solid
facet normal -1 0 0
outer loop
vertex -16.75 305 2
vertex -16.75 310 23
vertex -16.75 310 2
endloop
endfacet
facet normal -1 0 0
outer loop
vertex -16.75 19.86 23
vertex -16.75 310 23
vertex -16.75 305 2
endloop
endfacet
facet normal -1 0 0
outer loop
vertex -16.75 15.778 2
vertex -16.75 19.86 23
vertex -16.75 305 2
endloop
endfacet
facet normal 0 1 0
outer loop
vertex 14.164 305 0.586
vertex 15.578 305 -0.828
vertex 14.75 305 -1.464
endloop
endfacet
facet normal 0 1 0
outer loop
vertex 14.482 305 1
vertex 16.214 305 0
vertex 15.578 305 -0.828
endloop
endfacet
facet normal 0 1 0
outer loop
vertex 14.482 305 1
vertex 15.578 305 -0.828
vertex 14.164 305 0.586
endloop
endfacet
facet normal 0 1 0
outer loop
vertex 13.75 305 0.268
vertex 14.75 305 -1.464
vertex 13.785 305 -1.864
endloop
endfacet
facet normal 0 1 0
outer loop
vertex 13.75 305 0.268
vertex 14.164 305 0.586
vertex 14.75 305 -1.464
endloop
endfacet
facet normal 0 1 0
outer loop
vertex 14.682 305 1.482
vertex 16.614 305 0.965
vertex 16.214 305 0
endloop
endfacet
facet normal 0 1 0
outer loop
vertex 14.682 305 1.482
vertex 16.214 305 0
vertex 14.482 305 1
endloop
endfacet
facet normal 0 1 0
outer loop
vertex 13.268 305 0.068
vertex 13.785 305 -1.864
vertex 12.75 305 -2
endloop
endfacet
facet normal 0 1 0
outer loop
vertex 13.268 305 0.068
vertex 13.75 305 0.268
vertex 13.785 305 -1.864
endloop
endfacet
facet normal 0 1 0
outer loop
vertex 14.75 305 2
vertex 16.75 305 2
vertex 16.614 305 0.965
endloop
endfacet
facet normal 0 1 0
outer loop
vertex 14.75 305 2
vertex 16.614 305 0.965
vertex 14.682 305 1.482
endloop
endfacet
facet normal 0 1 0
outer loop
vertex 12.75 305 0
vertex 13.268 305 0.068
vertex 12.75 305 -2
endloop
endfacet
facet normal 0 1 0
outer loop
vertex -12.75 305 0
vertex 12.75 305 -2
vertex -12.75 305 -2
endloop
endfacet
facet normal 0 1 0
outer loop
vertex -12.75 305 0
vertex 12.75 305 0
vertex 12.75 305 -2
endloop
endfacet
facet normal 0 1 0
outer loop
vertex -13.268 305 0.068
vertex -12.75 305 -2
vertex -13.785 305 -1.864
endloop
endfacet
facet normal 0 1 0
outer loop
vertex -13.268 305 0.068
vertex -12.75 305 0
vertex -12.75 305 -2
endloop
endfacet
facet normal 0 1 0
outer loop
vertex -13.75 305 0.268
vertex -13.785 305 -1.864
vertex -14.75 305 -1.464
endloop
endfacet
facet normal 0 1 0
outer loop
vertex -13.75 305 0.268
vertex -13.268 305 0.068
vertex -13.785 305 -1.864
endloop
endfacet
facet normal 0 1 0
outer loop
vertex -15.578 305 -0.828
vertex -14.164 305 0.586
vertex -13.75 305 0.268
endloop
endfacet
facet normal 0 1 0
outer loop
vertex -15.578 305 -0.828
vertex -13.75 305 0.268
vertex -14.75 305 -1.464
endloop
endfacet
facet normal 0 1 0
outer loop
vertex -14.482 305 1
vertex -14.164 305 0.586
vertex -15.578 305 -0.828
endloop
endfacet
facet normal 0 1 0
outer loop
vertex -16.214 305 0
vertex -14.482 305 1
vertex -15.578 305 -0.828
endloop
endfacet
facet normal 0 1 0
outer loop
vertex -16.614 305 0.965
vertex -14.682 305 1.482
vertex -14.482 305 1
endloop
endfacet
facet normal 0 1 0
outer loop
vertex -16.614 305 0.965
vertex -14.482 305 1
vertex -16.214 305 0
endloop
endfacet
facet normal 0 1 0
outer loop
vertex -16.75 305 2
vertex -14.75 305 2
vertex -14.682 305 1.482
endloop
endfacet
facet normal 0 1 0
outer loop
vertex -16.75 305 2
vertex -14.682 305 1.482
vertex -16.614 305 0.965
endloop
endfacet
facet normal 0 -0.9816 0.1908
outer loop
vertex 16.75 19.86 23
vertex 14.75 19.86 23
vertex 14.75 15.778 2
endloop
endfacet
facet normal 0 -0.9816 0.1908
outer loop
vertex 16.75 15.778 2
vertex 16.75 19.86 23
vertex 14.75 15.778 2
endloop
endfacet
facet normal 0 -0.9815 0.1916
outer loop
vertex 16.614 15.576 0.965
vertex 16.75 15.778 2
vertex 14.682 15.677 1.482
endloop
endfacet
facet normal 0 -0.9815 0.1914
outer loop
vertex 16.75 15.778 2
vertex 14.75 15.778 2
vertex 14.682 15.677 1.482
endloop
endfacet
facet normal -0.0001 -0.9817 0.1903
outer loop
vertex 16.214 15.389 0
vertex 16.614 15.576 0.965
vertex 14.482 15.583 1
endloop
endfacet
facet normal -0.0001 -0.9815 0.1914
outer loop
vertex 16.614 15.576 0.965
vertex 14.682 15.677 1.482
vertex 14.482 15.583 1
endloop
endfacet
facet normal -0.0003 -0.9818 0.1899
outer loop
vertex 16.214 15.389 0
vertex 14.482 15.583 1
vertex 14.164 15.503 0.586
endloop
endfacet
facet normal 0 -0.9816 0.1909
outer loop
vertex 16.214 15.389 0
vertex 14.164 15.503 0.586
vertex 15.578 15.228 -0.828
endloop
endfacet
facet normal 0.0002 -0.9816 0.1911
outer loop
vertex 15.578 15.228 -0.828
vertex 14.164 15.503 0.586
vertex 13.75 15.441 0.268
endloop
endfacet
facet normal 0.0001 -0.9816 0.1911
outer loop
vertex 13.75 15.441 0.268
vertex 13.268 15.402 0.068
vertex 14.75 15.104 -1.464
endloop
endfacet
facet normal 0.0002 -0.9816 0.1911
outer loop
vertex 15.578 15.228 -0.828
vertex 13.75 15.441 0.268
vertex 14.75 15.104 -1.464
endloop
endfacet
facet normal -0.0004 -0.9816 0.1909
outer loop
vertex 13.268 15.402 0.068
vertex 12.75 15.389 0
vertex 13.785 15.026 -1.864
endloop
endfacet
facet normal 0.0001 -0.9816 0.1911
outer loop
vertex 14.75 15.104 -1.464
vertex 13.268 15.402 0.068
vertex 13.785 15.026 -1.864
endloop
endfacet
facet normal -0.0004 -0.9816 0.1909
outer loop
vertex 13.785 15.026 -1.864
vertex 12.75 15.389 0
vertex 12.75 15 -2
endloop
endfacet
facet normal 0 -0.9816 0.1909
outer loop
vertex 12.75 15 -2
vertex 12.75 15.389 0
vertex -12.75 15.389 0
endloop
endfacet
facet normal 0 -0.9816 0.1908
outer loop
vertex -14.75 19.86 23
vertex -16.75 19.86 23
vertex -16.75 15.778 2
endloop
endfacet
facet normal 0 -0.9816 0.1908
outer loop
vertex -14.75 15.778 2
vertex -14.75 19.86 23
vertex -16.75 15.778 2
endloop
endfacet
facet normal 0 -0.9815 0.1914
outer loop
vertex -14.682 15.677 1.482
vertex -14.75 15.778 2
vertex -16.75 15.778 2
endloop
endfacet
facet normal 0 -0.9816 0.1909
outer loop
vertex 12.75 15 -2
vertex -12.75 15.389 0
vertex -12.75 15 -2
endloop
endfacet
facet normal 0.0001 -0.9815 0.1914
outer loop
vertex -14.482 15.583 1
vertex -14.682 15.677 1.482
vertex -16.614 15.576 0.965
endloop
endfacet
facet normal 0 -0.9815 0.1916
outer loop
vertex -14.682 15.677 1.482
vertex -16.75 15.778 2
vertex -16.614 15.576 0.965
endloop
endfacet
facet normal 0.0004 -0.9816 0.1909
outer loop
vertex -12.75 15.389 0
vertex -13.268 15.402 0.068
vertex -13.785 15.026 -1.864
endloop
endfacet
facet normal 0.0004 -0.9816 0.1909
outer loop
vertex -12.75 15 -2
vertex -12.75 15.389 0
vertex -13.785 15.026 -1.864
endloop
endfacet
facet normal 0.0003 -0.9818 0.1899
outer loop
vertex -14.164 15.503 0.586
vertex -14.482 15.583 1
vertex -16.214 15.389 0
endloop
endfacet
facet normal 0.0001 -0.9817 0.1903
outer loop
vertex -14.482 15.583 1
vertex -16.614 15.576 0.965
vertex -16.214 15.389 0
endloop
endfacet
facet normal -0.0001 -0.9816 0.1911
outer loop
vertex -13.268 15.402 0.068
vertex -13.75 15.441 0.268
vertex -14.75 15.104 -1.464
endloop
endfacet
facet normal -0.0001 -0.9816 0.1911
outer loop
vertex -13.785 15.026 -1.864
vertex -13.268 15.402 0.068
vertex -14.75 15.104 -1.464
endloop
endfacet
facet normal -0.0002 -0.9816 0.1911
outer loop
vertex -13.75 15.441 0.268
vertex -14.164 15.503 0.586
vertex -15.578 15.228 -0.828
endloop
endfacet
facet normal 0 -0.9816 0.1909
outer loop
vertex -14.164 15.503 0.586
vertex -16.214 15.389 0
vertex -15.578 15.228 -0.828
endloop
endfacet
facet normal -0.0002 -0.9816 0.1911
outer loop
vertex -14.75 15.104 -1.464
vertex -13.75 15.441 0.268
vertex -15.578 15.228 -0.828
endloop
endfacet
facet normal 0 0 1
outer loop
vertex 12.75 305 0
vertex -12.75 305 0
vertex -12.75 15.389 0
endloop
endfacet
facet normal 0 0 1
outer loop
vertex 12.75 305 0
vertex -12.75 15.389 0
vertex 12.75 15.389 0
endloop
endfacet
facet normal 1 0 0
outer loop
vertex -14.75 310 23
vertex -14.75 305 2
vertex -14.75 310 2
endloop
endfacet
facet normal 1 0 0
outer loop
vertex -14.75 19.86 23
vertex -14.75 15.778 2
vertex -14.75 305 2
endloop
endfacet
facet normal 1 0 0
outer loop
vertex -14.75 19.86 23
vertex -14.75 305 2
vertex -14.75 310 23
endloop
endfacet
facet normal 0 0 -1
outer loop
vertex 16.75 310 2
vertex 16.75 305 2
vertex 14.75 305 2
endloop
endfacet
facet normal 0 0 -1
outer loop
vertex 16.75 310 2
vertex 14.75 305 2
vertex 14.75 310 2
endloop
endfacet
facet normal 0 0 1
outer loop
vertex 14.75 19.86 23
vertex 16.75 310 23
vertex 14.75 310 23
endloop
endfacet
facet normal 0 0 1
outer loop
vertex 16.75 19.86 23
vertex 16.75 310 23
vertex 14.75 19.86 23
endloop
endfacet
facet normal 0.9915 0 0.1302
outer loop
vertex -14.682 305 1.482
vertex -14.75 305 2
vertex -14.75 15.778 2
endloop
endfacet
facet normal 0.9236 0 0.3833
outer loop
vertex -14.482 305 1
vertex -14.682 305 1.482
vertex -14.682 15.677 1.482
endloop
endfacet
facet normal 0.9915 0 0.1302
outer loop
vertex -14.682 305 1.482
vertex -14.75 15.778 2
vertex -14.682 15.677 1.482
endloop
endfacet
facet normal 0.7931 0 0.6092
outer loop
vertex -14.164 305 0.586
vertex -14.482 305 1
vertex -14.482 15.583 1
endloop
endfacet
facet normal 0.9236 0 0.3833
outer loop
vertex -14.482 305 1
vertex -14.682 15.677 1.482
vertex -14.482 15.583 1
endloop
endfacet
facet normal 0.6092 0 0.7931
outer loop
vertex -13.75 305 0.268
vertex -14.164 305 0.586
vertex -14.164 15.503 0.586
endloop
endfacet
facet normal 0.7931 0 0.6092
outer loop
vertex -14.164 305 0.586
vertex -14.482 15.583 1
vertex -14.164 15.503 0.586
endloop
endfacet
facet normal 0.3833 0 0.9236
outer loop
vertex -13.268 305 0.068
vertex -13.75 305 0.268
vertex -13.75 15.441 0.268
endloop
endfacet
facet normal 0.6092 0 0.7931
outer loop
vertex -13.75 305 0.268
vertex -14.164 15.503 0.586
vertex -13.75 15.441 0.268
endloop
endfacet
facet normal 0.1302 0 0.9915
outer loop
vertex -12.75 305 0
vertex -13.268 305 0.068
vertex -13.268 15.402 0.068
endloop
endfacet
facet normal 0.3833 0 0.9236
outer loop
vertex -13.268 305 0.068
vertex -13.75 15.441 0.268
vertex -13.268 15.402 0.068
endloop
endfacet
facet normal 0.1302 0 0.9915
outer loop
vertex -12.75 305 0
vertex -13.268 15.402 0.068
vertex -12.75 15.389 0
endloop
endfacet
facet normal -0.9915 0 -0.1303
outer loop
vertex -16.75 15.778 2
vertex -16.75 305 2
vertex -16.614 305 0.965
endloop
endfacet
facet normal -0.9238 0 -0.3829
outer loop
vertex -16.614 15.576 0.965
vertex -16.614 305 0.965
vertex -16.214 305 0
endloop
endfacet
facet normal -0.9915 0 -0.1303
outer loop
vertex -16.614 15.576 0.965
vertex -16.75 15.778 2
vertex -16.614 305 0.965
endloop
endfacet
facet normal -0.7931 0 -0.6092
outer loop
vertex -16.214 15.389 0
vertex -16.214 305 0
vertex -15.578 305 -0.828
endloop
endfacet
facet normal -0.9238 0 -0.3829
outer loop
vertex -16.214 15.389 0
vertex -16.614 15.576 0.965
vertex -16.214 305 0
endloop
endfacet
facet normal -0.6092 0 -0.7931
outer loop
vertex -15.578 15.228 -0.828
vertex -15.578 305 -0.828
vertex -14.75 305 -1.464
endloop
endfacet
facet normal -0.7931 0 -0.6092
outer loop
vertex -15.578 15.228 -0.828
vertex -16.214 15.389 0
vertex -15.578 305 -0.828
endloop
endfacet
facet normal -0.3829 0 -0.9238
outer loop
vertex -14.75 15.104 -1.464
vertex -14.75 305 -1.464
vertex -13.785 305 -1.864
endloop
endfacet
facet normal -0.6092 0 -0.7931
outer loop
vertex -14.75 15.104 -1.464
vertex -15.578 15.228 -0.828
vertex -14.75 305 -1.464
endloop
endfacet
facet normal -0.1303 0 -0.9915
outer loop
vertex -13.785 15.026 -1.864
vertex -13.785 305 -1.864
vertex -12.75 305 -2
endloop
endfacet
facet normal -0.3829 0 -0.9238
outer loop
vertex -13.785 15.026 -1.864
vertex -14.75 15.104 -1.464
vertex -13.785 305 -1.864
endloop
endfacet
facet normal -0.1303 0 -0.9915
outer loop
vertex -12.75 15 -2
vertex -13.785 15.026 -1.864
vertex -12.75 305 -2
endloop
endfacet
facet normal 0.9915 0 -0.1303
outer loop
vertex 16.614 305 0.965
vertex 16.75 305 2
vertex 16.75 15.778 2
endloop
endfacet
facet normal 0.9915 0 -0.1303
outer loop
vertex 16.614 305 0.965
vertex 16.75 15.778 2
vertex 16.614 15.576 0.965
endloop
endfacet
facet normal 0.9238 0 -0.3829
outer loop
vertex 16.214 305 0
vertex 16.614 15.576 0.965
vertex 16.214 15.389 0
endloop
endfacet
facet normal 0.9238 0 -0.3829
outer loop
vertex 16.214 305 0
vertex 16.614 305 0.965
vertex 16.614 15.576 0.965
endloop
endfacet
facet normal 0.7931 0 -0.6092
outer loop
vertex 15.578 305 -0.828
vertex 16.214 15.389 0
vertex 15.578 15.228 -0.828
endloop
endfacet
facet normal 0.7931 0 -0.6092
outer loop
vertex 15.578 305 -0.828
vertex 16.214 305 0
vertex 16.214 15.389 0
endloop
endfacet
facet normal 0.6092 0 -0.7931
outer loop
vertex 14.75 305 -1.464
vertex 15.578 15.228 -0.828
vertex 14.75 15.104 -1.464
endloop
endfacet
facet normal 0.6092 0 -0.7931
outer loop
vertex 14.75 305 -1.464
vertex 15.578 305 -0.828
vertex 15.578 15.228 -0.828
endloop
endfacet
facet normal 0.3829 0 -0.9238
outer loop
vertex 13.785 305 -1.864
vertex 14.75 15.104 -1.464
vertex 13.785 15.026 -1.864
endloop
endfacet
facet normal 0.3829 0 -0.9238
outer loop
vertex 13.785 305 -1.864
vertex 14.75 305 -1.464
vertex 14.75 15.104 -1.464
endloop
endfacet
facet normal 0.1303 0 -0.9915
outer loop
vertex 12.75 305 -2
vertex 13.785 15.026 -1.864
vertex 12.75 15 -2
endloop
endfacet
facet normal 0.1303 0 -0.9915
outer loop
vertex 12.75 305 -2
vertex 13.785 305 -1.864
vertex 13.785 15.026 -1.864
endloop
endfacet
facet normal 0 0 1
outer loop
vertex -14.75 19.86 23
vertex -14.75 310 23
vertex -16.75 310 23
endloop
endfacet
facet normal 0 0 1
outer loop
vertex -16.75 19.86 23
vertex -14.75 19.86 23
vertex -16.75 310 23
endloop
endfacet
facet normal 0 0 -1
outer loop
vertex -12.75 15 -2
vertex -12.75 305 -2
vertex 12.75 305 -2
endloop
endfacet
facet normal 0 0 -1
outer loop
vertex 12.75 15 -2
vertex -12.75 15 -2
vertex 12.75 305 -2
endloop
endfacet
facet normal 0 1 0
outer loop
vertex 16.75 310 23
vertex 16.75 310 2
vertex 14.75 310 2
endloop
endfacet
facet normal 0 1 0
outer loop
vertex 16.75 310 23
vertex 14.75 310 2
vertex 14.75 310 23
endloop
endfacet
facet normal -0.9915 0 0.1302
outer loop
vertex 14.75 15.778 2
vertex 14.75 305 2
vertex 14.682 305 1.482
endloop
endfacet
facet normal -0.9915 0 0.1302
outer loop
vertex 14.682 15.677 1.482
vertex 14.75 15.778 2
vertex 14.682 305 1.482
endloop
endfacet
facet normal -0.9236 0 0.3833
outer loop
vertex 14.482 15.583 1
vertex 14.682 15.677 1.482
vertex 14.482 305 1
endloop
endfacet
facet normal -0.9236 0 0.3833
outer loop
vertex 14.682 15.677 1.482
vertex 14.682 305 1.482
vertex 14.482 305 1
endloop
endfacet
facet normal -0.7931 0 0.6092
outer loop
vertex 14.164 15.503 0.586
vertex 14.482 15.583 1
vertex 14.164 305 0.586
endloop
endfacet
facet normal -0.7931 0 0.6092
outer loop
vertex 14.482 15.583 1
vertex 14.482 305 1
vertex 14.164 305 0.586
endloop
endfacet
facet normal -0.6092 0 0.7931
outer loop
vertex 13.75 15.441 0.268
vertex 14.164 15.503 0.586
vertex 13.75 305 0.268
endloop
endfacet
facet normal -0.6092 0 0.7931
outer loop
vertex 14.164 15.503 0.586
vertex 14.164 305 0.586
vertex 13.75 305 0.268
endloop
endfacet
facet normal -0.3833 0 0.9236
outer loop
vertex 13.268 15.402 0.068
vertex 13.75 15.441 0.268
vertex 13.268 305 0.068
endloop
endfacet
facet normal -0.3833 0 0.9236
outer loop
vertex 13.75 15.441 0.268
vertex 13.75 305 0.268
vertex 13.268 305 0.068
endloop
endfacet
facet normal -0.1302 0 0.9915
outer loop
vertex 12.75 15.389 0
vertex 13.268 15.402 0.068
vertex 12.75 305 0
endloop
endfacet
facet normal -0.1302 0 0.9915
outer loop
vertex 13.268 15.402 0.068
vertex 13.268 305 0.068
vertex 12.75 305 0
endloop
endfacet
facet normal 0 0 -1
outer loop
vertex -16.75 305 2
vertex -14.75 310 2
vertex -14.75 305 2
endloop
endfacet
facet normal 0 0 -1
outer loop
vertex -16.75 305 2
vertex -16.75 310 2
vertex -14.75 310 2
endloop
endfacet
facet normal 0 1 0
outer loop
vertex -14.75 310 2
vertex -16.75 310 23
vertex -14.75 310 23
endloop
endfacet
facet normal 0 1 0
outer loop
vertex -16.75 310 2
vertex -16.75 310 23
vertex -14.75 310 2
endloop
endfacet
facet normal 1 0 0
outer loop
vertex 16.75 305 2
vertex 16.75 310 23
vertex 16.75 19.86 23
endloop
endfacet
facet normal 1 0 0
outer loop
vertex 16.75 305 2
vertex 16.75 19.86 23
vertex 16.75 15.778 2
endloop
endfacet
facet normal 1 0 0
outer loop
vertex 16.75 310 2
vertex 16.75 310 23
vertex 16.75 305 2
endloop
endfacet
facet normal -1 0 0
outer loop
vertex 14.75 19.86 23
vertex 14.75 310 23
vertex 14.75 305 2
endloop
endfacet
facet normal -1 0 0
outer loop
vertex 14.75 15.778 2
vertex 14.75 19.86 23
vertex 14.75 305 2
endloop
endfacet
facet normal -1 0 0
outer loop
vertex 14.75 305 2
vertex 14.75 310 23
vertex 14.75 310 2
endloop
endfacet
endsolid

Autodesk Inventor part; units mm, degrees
ref_plane "YZ Plane" through (0, 0, 0) normal (1, 0, 0) x (0, 1, 0)
ref_plane "XZ Plane" through (0, 0, 0) normal (0, 1, 0) x (-1, 0, 0)
ref_plane "XY Plane" through (0, 0, 0) normal (0, 0, 1) x (1, 0, 0)
sketch "Sketch1" plane through (0, 0, 0) normal (0, 0, 1) x (1, 0, 0)
  line L0 (-16.75, 305) -> (16.75, 305)
  line L1 (16.75, 305) -> (16.75, 0)
  line L2 (16.75, 0) -> (-16.75, 0)
  line L3 (-16.75, 0) -> (-16.75, 305)
  point P0 (0, 0)
  point P1 (0, 0)
  point P2 (0, 0)
  point P3 (0, 0)
  point P4 (0, 0)
  dimension "d27" = 33.5
  dimension "d29" = 305
extrude "Plate1" add sketch "Sketch1" against normal blind 2
sketch "Sketch2" plane through (14.75, 305, -2) normal (1, 0, 0) x (0, 1, 0)
  line L0 (-305, 0) -> (0, 0)
  line L1 (0, 0) -> (0, 25)
  line L2 (0, 25) -> (-305, 25)
  line L3 (-305, 25) -> (-305, 0)
edge flange "Flange1" height 25 angle 90 thickness 2 bend radius 2 thickness toward (1, 0, 0) relief tear relief width 2 relief depth 1 corner gap 2 corner form 0 edges at (16.75, 152.5, 0) (-16.75, 152.5, 0) wall of the first edge with corners at (14.75, 0, -2) (14.75, 305, -2) (14.75, 305, 23) (14.75, 0, 23)
bend "Bend1"
corner "Corner1"
sketch "Sketch3" plane through (16.75, 0, 23) normal (1, 0, 0) x (0, 0, -1)
  line L0 (0, 305) -> (21, 305)
  line L1 (21, 305) -> (21, 0)
  line L2 (21, 305) -> (21, 310)
  line L3 (21, 310) -> (0, 310)
  line L4 (0, 310) -> (0, 305)
  point P0 (23, 0)
  dimension "d40" = 5
sheet face with bend "Face2" sketch "Sketch3" thickness 2 toward (-1, 0, 0) bend radius 2
bend "Bend2"
mirror "Mirror1" about plane through (0, 0, 0) normal (1, 0, 0)
sketch "Sketch4" plane through (16.75, 0, 23) normal (1, 0, 0) x (0, 0, -1)
  line L0 (0, 310) -> (0, 0) projected
  line L1 (0, 19.8595) -> (25, 15)
  line L2 (25, 305) -> (25, 0) projected
  line L3 (25, 0) -> (0, 0)
  line L4 (21, 310) -> (0, 310) projected
  point P0 (23, 0)
  dimension "d46" = 295
  dimension "d47" = 11
extrude "Extrusion1" cut sketch "Sketch4" along normal through all both and the other way through all
equation "\"d47\" = wheel_pin_Angle"
equation "\"d15\" = Thickness"
equation "\"d30\" = BendReliefWidth"
equation "\"d31\" = BendReliefDepth"
equation "\"d32\" = MinimumRemnant"
equation "\"d33\" = TransitionRadius"
equation "\"d34\" = wheel_pin_h"
equation "\"d36\" = BendRadius"
equation "\"d37\" = CornerReliefSize"
equation "\"d38\" = GapSize"
equation "\"d39\" = JacobiRadiusSize"
equation "\"GapSize\" = Thickness"
equation "\"BendRadius\" = Thickness"
equation "\"MinimumRemnant\" = 2 * Thickness"
equation "\"BendReliefDepth\" = 0.5 * Thickness"
equation "\"BendReliefWidth\" = Thickness"
equation "\"CornerReliefSize\" = 4 * Thickness"
equation "\"JacobiRadiusSize\" = BendRadius"
equation "\"TransitionRadius\" = BendRadius"
equation "\"d41\" = BendRadius"
equation "\"d42\" = BendReliefWidth"
equation "\"d44\" = MinimumRemnant"
equation "\"d43\" = BendReliefDepth"
equation "\"d45\" = TransitionRadius"
equation "\"wheel_pin_Angle\" = 11deg"
equation "\"Thickness\" = 2"
equation "\"wheel_pin_h\" = 25"
properties part number "DMF v2.1 gear wheel pin 1"
